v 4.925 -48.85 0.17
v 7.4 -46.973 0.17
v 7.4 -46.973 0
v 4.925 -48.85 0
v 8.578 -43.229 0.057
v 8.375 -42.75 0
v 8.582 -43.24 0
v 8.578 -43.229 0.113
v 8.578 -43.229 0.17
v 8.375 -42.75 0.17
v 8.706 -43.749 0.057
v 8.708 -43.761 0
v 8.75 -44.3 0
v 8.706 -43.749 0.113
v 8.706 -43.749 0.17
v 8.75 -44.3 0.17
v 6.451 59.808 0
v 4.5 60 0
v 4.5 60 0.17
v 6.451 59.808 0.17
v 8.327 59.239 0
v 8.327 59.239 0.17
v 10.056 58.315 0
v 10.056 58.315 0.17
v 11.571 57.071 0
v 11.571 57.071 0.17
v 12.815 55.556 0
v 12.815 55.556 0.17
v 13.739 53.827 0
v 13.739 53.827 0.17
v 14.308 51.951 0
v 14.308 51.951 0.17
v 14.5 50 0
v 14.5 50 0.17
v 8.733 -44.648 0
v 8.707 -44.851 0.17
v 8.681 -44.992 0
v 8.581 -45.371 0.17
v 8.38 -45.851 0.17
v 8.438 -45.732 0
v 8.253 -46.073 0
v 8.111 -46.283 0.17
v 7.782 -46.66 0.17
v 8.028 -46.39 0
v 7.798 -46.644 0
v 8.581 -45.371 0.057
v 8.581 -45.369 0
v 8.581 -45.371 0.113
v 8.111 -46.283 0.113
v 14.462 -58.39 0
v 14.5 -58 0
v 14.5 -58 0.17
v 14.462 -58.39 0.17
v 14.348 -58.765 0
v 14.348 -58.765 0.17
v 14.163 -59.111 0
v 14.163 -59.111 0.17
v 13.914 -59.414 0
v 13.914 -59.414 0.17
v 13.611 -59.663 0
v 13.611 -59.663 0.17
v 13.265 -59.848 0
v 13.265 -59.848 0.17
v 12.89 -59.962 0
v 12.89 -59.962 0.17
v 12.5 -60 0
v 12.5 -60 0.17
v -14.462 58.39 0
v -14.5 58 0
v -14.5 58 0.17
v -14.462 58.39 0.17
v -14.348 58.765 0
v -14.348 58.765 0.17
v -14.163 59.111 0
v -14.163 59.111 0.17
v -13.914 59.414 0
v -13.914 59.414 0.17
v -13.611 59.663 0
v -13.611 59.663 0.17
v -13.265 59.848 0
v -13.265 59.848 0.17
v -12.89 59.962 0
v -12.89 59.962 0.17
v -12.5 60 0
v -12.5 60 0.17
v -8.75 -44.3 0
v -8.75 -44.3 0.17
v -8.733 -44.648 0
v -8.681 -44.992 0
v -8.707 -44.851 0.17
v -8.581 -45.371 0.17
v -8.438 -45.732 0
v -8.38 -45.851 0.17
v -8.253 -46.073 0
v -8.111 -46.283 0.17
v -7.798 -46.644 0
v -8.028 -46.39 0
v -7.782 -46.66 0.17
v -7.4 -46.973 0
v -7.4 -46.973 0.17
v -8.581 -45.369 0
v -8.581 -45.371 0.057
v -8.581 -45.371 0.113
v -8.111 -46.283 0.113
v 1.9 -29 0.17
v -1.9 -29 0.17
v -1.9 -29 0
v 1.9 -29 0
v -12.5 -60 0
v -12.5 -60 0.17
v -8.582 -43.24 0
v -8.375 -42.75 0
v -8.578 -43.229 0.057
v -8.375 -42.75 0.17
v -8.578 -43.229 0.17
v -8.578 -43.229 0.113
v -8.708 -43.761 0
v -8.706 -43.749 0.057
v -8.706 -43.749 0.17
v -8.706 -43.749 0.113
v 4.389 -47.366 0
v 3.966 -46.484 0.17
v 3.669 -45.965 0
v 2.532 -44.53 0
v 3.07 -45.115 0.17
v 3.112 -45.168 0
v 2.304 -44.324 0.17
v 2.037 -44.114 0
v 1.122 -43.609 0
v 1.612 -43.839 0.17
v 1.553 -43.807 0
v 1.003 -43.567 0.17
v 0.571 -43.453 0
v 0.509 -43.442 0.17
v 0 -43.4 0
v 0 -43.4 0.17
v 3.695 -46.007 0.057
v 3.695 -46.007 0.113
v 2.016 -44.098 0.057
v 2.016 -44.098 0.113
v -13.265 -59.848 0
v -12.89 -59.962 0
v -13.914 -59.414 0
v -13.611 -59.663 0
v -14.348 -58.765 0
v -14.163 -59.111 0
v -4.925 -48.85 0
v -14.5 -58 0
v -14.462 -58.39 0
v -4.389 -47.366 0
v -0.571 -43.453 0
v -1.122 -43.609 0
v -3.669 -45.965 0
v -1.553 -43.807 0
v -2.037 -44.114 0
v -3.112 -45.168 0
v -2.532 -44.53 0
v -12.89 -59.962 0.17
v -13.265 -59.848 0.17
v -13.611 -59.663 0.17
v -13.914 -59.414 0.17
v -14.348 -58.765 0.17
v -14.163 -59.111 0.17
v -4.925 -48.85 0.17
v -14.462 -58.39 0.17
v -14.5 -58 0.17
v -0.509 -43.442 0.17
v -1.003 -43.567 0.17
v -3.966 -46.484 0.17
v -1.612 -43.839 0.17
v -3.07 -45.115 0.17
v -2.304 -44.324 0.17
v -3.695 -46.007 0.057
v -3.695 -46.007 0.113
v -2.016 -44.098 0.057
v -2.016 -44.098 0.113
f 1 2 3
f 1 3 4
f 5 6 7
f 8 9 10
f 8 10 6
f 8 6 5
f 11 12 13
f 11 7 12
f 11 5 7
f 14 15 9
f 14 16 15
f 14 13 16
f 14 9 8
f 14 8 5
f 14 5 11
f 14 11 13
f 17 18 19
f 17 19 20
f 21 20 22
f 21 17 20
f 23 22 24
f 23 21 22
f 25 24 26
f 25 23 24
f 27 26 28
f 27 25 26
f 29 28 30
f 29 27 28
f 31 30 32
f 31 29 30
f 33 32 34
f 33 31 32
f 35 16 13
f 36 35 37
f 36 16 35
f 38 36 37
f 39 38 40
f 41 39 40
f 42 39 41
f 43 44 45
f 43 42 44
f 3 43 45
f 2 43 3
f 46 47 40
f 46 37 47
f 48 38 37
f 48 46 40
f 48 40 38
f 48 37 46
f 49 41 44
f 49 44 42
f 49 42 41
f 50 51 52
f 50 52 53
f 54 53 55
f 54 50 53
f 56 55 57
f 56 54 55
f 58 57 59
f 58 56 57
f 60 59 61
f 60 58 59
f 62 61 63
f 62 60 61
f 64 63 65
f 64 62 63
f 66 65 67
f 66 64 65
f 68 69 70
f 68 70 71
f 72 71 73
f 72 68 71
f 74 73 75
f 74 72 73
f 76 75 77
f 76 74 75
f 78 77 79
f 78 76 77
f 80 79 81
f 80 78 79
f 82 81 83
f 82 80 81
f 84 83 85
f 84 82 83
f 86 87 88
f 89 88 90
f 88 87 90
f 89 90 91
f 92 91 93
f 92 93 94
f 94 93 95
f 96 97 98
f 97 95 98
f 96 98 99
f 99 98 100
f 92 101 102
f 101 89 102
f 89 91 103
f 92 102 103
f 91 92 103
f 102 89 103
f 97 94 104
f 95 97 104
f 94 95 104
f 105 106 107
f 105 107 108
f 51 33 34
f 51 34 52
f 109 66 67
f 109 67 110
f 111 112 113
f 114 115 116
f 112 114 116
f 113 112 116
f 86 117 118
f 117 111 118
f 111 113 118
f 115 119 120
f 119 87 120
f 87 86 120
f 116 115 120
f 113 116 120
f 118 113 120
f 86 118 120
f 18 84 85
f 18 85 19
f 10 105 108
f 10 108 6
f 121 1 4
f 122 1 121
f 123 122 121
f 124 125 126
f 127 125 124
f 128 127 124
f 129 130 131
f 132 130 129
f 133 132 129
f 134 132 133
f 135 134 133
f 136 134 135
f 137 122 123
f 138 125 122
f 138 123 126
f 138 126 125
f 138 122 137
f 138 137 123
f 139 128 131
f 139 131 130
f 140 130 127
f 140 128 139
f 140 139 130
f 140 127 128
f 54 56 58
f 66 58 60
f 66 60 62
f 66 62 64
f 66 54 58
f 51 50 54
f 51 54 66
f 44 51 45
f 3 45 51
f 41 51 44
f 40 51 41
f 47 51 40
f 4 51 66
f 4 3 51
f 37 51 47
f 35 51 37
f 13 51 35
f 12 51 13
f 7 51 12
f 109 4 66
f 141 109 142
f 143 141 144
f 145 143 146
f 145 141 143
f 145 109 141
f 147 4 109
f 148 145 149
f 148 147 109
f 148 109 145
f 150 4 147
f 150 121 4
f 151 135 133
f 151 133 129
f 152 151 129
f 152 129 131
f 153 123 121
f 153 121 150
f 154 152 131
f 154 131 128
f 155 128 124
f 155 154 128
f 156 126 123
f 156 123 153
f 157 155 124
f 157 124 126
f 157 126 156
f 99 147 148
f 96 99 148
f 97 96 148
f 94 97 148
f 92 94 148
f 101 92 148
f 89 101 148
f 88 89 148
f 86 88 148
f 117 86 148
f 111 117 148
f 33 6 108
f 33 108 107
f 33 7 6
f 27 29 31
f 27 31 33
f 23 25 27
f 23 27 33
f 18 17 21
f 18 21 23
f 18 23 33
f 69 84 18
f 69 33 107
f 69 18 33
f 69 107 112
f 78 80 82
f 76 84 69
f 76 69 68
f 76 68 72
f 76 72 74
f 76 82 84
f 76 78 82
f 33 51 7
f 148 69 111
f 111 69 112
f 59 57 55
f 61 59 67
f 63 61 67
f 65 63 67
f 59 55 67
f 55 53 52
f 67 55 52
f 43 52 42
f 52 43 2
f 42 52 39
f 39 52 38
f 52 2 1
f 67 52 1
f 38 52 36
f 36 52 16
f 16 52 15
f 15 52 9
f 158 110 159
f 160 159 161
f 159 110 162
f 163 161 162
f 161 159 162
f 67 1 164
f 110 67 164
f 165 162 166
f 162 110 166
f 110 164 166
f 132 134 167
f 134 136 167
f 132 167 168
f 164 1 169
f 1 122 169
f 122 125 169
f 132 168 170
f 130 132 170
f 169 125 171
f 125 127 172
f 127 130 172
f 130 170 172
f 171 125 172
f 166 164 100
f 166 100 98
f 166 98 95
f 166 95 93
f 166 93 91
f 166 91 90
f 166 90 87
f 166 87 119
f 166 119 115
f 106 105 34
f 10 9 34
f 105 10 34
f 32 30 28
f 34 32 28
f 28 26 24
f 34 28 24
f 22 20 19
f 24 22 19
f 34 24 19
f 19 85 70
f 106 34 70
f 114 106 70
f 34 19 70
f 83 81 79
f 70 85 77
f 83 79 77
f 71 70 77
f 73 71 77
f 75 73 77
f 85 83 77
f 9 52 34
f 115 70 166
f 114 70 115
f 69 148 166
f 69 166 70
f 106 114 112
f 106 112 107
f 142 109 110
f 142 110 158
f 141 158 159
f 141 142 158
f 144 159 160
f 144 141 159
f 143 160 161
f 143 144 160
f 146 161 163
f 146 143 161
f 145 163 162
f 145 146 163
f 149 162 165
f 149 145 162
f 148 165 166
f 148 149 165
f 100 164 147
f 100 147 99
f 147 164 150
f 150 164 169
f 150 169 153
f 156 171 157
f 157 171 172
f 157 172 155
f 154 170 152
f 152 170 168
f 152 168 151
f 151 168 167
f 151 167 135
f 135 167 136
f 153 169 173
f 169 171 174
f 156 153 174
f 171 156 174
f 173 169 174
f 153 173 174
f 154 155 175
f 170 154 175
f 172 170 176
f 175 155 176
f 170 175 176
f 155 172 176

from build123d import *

# Parameters (mm, degrees)
BOSS_EXTRUDE6_DEPTH = 0.17
CUT_EXTRUDE4_DEPTH  = 62.727456614


with BuildPart() as part:
    # Sketch20 → Boss-Extrude6 (new body)
    with BuildSketch(Plane.XY):
        with BuildLine():
            Line((-12.5, 60), (4.5, 60))
            ThreePointArc((4.5, 60), (11.571067812, 57.071067812), (14.5, 50))
            Line((14.5, 50), (14.5, -58))
            ThreePointArc((14.5, -58), (13.914213562, -59.414213562), (12.5, -60))
            Line((12.5, -60), (-12.5, -60))
            ThreePointArc((-12.5, -60), (-13.914213562, -59.414213562), (-14.5, -58))
            Line((-14.5, -58), (-14.5, 58))
            ThreePointArc((-14.5, 58), (-13.914213562, 59.414213562), (-12.5, 60))
        make_face()
    extrude(amount=BOSS_EXTRUDE6_DEPTH)

    # Sketch14 → Cut-Extrude4 (cut, through all)
    with BuildSketch(Plane.XY.offset(0.17)):
        with BuildLine():
            Line((-1.9, -29), (1.9, -29))
            Line((1.9, -29), (8.375, -42.75))
            add(Edge.make_bspline(
                [(8.375, -42.75), (8.614001568, -43.20601542), (8.749703343, -43.736930638), (8.75, -44.3)],
                knots=[2, 2, 2, 2, 3, 3, 3, 3], degree=3))
            add(Edge.make_bspline(
                [(8.75, -44.3), (8.75059415, -45.427724457), (8.211440188, -46.416320927), (7.4, -46.97314145)],
                knots=[3, 3, 3, 3, 3.998304655, 3.998304655, 3.998304655, 3.998304655], degree=3))
            Line((7.4, -46.97314145), (4.925, -48.85))
            add(Edge.make_bspline(
                [(4.925, -48.85), (3.956162506, -45.631727685), (2.146734918, -43.400643505), (0, -43.4)],
                knots=[5.0019278, 5.0019278, 5.0019278, 5.0019278, 5.999902224, 5.999902224, 5.999902224, 5.999902224], degree=3))
            add(Edge.make_bspline(
                [(-4.925, -48.85), (-3.956162506, -45.631727685), (-2.146734918, -43.400643505), (0, -43.4)],
                knots=[5.0019278, 5.0019278, 5.0019278, 5.0019278, 5.999902224, 5.999902224, 5.999902224, 5.999902224], degree=3))
            Line((-4.925, -48.85), (-7.4, -46.97314145))
            add(Edge.make_bspline(
                [(-8.75, -44.3), (-8.75059415, -45.427724457), (-8.211440188, -46.416320927), (-7.4, -46.97314145)],
                knots=[3, 3, 3, 3, 3.998304655, 3.998304655, 3.998304655, 3.998304655], degree=3))
            add(Edge.make_bspline(
                [(-8.375, -42.75), (-8.614001568, -43.20601542), (-8.749703343, -43.736930638), (-8.75, -44.3)],
                knots=[2, 2, 2, 2, 3, 3, 3, 3], degree=3))
            Line((-8.375, -42.75), (-1.9, -29))
        make_face()
    extrude(amount=-CUT_EXTRUDE4_DEPTH, mode=Mode.SUBTRACT)


solid = part.part
